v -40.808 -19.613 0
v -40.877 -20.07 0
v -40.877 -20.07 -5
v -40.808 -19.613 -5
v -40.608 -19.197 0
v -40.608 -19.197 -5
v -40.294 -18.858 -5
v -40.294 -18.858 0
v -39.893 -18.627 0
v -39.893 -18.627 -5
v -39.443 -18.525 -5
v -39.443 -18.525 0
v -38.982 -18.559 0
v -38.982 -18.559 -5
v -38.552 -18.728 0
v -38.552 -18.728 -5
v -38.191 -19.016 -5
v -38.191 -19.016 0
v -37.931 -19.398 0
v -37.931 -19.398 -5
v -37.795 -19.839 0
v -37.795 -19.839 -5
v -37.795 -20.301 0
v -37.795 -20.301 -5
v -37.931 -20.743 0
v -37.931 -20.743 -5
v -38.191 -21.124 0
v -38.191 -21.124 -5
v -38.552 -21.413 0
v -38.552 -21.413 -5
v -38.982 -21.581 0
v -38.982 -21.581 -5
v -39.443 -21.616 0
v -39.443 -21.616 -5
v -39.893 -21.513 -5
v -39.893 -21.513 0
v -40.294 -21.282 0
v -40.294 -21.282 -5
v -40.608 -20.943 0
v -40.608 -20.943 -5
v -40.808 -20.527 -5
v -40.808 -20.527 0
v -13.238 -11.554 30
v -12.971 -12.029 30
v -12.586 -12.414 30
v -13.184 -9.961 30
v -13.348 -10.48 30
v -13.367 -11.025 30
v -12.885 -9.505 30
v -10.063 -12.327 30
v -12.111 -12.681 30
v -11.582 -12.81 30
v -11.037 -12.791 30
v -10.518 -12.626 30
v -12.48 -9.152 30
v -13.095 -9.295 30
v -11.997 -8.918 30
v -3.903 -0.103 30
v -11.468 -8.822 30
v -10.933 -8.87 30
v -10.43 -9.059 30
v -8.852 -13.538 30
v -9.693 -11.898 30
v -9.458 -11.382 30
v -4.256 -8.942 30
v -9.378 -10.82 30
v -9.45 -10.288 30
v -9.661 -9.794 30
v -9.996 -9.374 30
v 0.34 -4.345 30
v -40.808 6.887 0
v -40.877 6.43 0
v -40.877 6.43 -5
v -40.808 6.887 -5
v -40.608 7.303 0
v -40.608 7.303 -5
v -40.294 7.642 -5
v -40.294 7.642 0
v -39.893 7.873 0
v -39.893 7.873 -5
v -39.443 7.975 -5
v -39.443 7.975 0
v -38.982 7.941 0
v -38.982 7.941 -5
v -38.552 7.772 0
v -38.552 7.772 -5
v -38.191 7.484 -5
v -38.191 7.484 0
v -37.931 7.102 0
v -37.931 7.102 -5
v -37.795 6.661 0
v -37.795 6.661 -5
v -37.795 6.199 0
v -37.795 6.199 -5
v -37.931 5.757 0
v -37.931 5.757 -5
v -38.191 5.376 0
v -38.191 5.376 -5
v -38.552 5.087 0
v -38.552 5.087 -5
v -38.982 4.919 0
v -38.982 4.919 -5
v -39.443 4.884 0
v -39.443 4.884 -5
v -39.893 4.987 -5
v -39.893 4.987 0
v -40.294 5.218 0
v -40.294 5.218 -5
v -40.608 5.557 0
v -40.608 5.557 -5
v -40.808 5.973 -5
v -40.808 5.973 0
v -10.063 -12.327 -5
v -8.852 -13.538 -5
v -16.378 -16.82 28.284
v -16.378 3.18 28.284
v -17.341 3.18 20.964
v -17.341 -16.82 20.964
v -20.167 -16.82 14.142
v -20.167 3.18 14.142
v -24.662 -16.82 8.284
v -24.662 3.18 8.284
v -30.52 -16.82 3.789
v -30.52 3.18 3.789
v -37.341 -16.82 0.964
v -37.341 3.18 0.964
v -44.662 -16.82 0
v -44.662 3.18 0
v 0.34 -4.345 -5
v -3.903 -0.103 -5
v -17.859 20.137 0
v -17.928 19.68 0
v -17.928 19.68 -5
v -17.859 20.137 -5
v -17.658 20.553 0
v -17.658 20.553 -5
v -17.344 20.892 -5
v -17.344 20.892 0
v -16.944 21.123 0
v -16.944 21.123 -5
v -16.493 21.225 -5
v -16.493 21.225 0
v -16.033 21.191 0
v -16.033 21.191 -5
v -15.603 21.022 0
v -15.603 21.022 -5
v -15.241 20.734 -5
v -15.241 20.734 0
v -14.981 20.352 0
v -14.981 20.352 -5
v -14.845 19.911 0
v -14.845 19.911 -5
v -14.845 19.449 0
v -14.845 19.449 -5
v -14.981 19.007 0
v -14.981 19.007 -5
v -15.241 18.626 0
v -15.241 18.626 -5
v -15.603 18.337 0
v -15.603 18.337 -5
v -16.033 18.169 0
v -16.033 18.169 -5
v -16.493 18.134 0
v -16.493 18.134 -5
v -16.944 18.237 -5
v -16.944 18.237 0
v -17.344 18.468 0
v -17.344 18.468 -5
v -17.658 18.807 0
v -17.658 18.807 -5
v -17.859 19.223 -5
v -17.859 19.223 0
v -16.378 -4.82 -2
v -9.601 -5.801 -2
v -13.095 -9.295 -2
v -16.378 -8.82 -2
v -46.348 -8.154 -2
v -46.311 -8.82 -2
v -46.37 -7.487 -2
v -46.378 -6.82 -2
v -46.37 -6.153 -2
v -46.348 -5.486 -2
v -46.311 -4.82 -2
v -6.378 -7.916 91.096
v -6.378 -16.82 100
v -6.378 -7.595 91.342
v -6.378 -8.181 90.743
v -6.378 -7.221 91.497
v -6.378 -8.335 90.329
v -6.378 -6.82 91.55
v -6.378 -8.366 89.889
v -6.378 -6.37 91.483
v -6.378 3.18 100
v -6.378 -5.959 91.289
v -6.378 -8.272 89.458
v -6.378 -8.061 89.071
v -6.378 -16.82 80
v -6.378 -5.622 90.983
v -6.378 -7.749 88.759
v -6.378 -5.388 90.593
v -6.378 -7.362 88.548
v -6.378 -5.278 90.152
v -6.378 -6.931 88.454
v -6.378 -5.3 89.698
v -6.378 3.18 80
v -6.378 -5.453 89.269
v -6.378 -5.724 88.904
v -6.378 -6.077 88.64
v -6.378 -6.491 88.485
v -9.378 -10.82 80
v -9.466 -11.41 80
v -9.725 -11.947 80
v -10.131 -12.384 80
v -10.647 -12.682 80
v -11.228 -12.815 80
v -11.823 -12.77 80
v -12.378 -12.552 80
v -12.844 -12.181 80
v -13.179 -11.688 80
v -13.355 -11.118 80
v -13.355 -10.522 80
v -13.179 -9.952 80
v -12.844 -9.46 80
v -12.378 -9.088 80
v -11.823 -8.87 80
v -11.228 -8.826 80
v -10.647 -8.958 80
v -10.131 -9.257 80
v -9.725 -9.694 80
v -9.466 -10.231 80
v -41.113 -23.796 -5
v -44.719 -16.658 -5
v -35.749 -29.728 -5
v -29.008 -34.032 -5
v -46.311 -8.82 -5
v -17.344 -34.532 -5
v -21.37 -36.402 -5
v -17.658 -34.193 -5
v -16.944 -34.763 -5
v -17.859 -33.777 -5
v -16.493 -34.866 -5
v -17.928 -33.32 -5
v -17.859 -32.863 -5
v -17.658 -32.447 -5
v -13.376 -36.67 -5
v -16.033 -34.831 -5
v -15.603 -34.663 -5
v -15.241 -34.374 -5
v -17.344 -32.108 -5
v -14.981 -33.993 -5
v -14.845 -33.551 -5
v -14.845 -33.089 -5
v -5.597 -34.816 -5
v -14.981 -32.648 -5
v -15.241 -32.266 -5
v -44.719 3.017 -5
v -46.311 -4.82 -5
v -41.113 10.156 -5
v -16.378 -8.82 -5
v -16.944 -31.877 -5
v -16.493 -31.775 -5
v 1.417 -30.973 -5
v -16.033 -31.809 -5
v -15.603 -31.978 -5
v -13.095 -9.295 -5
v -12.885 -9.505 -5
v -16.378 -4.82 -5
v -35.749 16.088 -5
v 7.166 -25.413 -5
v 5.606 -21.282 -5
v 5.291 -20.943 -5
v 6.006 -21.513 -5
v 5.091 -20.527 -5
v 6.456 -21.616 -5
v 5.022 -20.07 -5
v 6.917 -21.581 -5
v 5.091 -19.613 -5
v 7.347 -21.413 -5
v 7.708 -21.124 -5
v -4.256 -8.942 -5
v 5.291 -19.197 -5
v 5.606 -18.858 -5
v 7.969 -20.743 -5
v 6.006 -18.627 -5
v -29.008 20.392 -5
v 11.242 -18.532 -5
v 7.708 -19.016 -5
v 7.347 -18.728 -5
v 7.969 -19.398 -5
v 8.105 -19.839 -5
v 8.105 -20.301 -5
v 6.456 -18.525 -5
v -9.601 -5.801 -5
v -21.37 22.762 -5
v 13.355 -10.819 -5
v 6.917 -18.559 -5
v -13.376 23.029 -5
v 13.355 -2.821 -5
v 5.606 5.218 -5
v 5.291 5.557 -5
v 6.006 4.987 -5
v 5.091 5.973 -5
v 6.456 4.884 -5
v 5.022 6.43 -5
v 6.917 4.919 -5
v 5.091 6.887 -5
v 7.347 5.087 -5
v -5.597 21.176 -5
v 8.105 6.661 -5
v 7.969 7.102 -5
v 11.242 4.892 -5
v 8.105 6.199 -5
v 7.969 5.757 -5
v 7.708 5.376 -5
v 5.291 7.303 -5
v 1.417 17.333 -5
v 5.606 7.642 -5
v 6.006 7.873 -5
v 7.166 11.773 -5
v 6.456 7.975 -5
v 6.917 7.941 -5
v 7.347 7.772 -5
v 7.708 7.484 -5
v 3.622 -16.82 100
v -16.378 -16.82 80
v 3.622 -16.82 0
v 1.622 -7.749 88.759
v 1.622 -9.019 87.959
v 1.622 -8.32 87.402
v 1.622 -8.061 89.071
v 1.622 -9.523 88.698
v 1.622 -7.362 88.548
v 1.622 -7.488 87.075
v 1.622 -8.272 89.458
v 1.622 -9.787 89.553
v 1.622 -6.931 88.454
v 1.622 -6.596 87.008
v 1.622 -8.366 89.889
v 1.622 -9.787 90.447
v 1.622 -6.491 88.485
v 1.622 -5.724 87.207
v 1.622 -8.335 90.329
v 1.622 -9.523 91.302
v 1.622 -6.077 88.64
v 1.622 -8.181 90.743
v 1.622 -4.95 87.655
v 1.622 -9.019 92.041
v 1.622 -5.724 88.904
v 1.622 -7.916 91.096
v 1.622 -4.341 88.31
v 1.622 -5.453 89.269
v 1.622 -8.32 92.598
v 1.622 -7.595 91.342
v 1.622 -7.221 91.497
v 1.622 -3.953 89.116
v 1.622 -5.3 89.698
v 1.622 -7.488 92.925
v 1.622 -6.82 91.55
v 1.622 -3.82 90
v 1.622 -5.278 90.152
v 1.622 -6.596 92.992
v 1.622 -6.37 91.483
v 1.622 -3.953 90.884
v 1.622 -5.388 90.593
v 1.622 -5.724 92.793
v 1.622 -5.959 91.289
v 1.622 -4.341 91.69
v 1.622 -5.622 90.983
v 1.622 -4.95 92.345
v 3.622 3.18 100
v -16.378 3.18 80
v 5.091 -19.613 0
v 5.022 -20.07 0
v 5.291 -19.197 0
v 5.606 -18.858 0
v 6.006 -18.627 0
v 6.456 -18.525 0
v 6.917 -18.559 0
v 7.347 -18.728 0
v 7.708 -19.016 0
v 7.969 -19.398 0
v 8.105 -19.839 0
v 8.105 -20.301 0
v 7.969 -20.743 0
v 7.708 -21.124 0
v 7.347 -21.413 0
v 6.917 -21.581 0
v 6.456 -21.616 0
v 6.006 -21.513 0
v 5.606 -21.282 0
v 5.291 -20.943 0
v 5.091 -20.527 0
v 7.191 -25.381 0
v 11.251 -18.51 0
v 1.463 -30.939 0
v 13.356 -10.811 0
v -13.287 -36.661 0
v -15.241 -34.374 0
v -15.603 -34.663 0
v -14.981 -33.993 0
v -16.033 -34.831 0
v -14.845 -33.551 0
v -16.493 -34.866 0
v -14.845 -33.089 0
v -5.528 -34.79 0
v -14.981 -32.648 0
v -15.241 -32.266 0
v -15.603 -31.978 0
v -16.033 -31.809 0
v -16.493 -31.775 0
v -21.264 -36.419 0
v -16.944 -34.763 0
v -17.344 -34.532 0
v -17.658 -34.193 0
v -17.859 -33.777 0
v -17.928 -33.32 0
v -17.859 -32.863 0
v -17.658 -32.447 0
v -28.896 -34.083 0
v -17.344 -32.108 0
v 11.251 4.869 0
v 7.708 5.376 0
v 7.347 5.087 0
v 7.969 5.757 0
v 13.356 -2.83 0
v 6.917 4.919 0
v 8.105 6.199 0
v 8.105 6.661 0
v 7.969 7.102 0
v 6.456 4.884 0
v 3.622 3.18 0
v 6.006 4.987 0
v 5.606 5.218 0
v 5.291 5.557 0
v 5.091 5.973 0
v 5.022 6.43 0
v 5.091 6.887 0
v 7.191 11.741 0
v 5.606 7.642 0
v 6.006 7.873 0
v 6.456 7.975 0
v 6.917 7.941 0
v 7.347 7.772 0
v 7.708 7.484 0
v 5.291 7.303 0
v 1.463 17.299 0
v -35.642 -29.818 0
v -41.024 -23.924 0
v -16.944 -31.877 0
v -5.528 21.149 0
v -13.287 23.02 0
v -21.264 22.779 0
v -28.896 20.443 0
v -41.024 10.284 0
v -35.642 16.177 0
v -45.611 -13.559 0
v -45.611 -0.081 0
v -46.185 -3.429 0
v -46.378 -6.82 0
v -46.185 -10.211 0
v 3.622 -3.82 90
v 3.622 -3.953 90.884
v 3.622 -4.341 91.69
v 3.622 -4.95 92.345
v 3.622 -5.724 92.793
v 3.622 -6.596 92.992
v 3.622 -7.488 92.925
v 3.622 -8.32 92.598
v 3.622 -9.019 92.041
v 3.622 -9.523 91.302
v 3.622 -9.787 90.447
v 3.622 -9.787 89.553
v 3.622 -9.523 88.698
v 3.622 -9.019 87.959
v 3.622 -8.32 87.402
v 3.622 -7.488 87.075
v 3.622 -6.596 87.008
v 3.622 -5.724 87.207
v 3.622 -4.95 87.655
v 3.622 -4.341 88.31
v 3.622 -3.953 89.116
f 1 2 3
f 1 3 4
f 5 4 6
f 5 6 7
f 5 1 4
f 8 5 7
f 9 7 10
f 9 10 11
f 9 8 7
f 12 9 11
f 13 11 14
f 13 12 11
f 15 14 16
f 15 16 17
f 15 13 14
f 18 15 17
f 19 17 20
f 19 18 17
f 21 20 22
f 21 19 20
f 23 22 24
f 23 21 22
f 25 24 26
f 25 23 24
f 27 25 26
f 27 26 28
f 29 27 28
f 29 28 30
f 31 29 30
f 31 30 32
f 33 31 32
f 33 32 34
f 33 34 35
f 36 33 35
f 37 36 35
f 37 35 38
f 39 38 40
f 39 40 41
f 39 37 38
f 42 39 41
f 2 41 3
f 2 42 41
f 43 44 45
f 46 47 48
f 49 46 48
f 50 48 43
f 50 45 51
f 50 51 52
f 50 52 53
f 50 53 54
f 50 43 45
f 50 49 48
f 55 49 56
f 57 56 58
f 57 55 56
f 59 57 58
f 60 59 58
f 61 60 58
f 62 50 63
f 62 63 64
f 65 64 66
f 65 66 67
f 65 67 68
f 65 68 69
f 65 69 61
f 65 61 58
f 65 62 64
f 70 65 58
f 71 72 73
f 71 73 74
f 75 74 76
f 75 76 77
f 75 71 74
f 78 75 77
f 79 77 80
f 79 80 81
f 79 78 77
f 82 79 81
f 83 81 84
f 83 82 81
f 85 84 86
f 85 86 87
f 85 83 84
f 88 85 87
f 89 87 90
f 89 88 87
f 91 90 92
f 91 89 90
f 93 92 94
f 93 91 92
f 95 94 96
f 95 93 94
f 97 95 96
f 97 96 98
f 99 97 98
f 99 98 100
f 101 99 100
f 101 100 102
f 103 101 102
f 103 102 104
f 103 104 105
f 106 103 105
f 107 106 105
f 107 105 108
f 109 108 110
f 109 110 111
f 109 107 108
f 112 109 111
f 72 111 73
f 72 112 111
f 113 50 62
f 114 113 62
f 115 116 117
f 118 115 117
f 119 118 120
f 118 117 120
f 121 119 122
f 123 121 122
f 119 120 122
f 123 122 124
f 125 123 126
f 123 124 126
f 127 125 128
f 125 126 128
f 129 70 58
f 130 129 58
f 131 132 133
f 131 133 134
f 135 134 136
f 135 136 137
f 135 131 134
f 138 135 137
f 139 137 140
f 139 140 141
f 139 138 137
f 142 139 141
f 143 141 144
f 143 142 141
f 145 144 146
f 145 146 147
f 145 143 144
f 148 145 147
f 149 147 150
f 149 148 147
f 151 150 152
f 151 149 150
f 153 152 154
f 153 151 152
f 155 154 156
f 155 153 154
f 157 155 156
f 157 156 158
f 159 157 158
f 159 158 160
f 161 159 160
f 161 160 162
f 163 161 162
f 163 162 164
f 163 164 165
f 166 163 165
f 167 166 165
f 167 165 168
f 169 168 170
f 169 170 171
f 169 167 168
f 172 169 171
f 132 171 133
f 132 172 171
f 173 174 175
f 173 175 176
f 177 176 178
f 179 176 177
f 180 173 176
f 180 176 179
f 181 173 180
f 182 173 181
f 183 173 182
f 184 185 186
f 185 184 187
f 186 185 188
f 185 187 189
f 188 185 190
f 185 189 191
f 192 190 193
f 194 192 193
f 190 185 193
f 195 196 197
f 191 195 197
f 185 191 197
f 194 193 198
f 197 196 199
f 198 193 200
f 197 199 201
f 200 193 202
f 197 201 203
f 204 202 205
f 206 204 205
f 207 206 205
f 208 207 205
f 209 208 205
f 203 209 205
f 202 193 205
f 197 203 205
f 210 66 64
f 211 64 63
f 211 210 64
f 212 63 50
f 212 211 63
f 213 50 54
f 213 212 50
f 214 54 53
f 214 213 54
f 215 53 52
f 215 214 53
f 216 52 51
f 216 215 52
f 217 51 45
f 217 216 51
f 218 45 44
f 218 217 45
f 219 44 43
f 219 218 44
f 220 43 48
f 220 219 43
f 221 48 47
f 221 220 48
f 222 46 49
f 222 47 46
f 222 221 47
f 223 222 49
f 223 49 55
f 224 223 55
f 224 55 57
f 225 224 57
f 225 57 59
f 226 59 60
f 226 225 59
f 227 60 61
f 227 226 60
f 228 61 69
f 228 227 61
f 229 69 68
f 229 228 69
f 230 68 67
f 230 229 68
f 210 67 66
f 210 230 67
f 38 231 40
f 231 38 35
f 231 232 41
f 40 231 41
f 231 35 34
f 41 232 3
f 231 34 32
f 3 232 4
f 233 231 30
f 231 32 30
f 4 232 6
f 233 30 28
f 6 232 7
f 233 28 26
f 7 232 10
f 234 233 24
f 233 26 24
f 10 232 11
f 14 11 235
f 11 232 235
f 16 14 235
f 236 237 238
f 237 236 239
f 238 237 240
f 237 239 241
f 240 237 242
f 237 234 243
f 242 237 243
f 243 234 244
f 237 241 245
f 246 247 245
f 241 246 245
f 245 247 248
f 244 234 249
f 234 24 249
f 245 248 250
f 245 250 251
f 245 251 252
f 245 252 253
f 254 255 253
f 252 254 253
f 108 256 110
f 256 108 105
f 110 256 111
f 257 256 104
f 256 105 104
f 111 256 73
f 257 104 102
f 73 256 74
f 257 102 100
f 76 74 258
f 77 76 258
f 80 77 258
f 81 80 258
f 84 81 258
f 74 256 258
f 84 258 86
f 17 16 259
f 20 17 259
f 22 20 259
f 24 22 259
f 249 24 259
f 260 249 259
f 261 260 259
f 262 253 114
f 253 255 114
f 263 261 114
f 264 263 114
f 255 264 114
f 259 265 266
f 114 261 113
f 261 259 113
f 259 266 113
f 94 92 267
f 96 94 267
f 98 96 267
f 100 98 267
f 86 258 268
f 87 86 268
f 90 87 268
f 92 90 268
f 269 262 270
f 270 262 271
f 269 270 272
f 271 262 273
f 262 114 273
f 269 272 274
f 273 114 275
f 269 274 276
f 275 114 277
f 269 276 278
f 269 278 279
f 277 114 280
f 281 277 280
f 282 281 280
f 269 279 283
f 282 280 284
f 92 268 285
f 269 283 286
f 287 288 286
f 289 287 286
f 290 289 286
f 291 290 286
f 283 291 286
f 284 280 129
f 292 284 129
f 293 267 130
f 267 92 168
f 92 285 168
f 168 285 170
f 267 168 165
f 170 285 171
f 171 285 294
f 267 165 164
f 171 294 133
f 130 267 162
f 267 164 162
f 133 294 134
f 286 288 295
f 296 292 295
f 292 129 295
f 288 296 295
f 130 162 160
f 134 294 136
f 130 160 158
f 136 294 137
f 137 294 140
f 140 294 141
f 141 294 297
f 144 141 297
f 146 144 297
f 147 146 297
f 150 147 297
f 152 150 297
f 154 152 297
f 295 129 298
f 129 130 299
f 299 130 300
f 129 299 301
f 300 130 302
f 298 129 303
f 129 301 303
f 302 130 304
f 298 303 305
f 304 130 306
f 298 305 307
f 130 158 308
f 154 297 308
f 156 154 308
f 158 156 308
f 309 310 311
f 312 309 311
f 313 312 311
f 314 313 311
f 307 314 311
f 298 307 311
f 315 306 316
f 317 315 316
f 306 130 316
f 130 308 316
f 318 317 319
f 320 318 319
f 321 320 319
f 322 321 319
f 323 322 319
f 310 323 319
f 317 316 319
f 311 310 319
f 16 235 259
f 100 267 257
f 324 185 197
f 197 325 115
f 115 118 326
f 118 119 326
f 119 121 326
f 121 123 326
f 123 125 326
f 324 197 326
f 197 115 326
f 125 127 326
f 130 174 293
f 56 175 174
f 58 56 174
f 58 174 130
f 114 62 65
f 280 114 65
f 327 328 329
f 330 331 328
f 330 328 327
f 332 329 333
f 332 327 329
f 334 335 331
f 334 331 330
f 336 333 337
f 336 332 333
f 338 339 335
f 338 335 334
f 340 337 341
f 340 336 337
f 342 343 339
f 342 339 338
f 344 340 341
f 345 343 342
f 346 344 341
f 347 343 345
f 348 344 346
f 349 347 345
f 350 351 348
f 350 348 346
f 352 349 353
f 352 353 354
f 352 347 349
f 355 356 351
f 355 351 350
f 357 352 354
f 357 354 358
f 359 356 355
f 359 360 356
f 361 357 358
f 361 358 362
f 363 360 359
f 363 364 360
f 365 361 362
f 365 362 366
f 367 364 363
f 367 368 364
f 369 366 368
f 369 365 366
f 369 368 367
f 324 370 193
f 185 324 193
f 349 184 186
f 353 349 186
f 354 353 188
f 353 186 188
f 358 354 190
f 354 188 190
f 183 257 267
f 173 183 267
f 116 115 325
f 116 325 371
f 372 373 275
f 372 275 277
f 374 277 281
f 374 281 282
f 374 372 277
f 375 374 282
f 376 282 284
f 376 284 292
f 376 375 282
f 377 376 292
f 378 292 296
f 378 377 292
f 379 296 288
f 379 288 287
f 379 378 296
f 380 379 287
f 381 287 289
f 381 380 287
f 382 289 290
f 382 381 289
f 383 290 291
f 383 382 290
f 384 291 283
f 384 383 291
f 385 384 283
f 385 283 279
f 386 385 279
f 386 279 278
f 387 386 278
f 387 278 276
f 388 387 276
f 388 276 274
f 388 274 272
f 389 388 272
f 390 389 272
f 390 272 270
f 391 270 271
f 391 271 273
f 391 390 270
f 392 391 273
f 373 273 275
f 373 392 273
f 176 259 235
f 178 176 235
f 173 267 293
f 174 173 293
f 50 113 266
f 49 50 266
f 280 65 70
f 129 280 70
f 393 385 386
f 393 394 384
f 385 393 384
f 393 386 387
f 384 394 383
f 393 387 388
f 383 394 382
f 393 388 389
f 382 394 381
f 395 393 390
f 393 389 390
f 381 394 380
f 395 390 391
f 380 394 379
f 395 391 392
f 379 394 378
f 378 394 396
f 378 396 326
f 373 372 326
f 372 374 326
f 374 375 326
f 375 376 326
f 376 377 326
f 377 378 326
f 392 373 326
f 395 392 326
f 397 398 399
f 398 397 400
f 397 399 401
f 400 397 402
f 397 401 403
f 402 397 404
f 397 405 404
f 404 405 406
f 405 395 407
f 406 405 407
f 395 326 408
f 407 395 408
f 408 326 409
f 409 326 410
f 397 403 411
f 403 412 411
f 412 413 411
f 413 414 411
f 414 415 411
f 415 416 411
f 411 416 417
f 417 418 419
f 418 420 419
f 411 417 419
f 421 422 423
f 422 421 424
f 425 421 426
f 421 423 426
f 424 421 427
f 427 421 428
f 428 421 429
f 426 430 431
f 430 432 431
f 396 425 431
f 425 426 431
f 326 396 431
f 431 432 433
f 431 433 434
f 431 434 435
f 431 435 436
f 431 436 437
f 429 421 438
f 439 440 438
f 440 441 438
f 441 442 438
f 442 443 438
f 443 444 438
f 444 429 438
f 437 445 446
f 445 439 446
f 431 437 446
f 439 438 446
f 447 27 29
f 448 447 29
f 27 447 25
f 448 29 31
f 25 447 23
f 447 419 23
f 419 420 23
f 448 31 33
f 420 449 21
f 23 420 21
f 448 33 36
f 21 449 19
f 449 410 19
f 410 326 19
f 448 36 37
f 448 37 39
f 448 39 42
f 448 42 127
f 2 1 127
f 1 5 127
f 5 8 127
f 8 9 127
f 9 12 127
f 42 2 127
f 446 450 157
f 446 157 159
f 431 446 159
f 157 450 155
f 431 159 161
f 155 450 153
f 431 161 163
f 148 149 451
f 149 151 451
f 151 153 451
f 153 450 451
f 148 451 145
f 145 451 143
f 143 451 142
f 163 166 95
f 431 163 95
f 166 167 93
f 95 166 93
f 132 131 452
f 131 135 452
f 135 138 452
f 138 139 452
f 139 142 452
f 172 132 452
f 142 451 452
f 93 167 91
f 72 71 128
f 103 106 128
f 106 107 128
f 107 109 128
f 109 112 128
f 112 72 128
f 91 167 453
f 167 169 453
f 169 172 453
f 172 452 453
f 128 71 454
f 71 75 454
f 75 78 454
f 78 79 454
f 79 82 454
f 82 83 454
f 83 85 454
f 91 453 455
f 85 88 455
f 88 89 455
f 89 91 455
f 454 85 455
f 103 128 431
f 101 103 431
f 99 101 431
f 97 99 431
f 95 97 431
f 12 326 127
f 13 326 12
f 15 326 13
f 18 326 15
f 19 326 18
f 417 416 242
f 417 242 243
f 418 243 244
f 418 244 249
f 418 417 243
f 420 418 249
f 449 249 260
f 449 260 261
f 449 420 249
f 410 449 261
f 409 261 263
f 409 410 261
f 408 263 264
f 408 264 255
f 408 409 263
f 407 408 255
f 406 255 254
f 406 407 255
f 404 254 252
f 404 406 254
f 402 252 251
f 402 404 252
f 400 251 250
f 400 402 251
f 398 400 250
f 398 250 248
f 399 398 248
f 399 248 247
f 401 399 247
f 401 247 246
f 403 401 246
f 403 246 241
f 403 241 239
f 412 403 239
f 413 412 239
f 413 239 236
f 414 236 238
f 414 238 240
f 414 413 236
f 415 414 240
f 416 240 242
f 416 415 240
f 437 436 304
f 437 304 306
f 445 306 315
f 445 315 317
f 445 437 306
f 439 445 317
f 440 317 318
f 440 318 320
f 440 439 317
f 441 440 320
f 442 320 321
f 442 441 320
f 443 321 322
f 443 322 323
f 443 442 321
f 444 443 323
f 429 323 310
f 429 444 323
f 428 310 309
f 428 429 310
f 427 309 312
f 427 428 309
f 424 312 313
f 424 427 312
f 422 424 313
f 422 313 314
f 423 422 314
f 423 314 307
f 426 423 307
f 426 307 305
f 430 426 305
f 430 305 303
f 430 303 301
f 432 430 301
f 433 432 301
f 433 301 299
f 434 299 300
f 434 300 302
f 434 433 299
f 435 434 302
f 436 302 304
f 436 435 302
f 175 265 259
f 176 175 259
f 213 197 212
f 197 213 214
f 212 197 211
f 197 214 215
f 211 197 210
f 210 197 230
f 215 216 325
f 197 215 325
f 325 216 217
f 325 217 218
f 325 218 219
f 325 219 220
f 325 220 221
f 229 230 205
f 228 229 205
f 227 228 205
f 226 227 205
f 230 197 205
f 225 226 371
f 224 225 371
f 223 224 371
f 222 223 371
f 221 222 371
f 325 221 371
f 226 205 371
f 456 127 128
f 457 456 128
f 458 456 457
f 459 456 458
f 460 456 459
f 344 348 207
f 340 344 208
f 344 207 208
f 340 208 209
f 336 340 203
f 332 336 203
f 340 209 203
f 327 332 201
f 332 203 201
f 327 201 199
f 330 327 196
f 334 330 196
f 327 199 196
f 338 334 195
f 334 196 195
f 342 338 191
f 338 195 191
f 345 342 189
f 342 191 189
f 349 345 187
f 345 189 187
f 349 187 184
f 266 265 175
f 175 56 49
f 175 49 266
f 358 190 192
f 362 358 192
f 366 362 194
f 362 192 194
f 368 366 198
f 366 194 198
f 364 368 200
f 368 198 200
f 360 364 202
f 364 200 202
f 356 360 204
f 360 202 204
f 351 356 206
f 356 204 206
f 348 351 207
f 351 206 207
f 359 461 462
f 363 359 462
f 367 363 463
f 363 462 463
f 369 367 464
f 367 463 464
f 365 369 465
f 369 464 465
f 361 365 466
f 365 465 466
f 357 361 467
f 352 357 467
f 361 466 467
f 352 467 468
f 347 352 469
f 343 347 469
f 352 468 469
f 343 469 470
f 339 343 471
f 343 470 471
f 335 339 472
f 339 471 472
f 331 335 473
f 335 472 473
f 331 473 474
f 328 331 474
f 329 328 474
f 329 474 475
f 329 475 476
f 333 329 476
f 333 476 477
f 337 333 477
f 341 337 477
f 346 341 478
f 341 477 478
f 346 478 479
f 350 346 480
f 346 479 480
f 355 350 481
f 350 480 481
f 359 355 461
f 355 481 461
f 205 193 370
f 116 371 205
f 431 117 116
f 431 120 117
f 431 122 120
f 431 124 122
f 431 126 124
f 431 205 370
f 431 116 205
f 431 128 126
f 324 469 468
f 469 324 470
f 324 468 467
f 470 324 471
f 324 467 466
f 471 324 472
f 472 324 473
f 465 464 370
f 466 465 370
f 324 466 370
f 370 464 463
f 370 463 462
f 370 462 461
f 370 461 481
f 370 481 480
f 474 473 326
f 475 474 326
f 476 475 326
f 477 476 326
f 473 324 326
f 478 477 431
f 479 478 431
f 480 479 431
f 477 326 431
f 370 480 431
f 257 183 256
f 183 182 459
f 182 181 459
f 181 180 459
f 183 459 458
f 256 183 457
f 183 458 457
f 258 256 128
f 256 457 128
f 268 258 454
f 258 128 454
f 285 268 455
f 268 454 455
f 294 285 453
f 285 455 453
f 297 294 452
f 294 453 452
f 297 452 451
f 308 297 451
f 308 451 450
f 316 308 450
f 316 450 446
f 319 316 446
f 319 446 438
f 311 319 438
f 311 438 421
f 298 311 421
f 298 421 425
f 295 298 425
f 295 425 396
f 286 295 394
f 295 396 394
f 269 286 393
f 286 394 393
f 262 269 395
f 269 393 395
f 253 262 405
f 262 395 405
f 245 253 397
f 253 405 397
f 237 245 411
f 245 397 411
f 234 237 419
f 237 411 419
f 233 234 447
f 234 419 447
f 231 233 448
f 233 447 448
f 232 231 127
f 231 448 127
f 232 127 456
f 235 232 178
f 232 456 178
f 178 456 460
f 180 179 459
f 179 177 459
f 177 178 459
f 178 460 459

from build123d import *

# Parameters (mm, degrees)
SKETCH_1_W          = 20
SKETCH_1_H          = 20
EXTRUDE_1_DEPTH     = 140
SKETCH_2_R          = 30
SKETCH_2_R_2        = 1.55
EXTRUDE_2_DEPTH     = 5
SKETCH_3_W          = 28.284271248
SKETCH_3_H          = 20
EXTRUDE_3_DEPTH     = 28.28427125
CUT_EXTRUDE_1_DEPTH = 28.28427125
CUT_EXTRUDE_2_DEPTH = 28.28427125
CUT_EXTRUDE_3_DEPTH = 28.28427125
SKETCH_8_R          = 3
CUT_EXTRUDE_4_DEPTH = 2
SKETCH_9_R          = 2
CUT_EXTRUDE_5_DEPTH = 100
CUT_EXTRUDE_6_DEPTH = 3
CUT_EXTRUDE_7_DEPTH = 3
SKETCH_12_W         = 20
SKETCH_12_H         = 20
SKETCH_12_R         = 2
EXTRUDE_5_DEPTH     = 3
CUT_EXTRUDE_START   = -35
SKETCH_13_R         = 2
CUT_EXTRUDE_8_DEPTH = 35
CUT_EXTRUDE_9_DEPTH = 3
EXTRUDE_START       = -35
EXTRUDE_6_DEPTH     = 35


with BuildPart() as part:
    # 草图1 → 凸台-拉伸1 (new body)
    with BuildSketch(Plane.XY):
        with Locations((-6.377546769, -6.820183169)):
            Rectangle(SKETCH_1_W, SKETCH_1_H)
    extrude(amount=EXTRUDE_1_DEPTH)

    # 草图2 → 凸台-拉伸2 (add)
    with BuildSketch(Plane(origin=(0, 0, 0), x_dir=(-1, 0, 0), z_dir=(0, 0, -1))):
        with Locations((16.377546769, -6.820183169)):
            Circle(SKETCH_2_R)
        with Locations((-6.572126431, 6.429816831)):
            Circle(SKETCH_2_R_2, mode=Mode.SUBTRACT)
        with Locations((16.377546769, 19.679816831)):
            Circle(SKETCH_2_R_2, mode=Mode.SUBTRACT)
        with Locations((39.32721997, 6.429816831)):
            Circle(SKETCH_2_R_2, mode=Mode.SUBTRACT)
        with Locations((39.32721997, -20.070183169)):
            Circle(SKETCH_2_R_2, mode=Mode.SUBTRACT)
        with Locations((16.377546769, -33.320183169)):
            Circle(SKETCH_2_R_2, mode=Mode.SUBTRACT)
        with Locations((-6.572126431, -20.070183169)):
            Circle(SKETCH_2_R_2, mode=Mode.SUBTRACT)
    extrude(amount=EXTRUDE_2_DEPTH)

    # 草图3 → 凸台-拉伸3 (add)
    with BuildSketch(Plane.XY):
        with Locations((-30.519682393, -6.820183169)):
            Rectangle(SKETCH_3_W, SKETCH_3_H)
    extrude(amount=EXTRUDE_3_DEPTH)

    # 草图4 → 切除-拉伸1 (cut)
    with BuildSketch(Plane(origin=(0, 3.179816831, 0), x_dir=(1, 0, 0), z_dir=(0, 1, 0))):
        with BuildLine():
            Line((-44.661818017, -3e-09), (-44.661818017, -28.28427125))
            Line((-44.661818017, -28.28427125), (-16.377546769, -28.28427125))
            ThreePointArc((-16.377546769, -28.28427125), (-24.661818017, -8.28427125), (-44.661818017, -3e-09))
        make_face()
    extrude(amount=-CUT_EXTRUDE_1_DEPTH, mode=Mode.SUBTRACT)

    # 草图6 → 切除-拉伸2 (cut)
    with BuildSketch(Plane(origin=(0, 3.179816831, 0), x_dir=(1, 0, 0), z_dir=(0, 1, 0))):
        Polygon((3.622453231, -140), (3.622453231, -100), (-6.377546769, -100), (-6.377546769, -80), (-16.377546769, -80), (-16.377546769, -100), (-16.377546769, -140), align=None)
    extrude(amount=-CUT_EXTRUDE_2_DEPTH, mode=Mode.SUBTRACT)

    # 草图7 → 切除-拉伸3 (cut)
    with BuildSketch(Plane.ZY.offset(6.377546769)):
        with BuildLine():
            ThreePointArc((91.55, -6.820183169), (90.59315932, -5.388169893), (88.903984489, -5.724167658))
            Line((88.903984489, -5.724167658), (91.096015511, -7.91619868))
            ThreePointArc((91.096015511, -7.91619868), (91.432013275, -7.413342489), (91.55, -6.820183169))
        make_face()
        with BuildLine():
            Line((91.096015511, -7.91619868), (88.903984489, -5.724167658))
            ThreePointArc((88.903984489, -5.724167658), (88.903984489, -7.91619868), (91.096015511, -7.91619868))
        make_face()
    extrude(amount=-CUT_EXTRUDE_3_DEPTH, mode=Mode.SUBTRACT)

    # 草图8 → 切除-拉伸4 (cut)
    with BuildSketch(Plane(origin=(3.622453231, 0, 0), x_dir=(0, 0, -1), z_dir=(1, 0, 0))):
        with Locations(Location((-90, -6.820183169, 0), (0, 0, 90))):
            Circle(SKETCH_8_R)
    extrude(amount=-CUT_EXTRUDE_4_DEPTH, mode=Mode.SUBTRACT)

    # 草图9 → 切除-拉伸5 (cut)
    with BuildSketch(Plane.XY.offset(80)):
        with Locations((-11.377546769, -10.820183169)):
            Circle(SKETCH_9_R)
    extrude(amount=-CUT_EXTRUDE_5_DEPTH, mode=Mode.SUBTRACT)

    # 草图10 → 切除-拉伸6 (cut)
    with BuildSketch(Plane(origin=(0, 0, -5), x_dir=(-1, 0, 0), z_dir=(0, 0, -1))):
        Polygon((11.377546769, -10.820183169), (12.756937733, -12.268495932), (16.377546769, -8.820183169), (50.683077944, -8.820183169), (50.683077944, -4.820183169), (16.377546769, -4.820183169), (10.220185265, -9.18901728), align=None)
    extrude(amount=-CUT_EXTRUDE_6_DEPTH, mode=Mode.SUBTRACT)

    # 草图11 → 切除-拉伸7 (cut)
    with BuildSketch(Plane(origin=(0, 0, -5), x_dir=(-1, 0, 0), z_dir=(0, 0, -1))):
        Polygon((-3.622453231, -6.820183169), (-3.622453231, 3.179816831), (16.377546769, 3.179816831), (16.377546769, -16.820183169), (-3.622453231, -16.820183169), align=None)
    extrude(amount=-CUT_EXTRUDE_7_DEPTH, mode=Mode.SUBTRACT)

    # 草图12 → 凸台-拉伸5 (add)
    with BuildSketch(Plane(origin=(0, 0, -2), x_dir=(-1, 0, 0), z_dir=(0, 0, -1))):
        with Locations((6.377546769, -6.820183169)):
            Rectangle(SKETCH_12_W, SKETCH_12_H)
        with Locations(Location((11.377546769, -10.820183169, 0), (0, 0, 180))):
            Circle(SKETCH_12_R, mode=Mode.SUBTRACT)
    extrude(amount=EXTRUDE_5_DEPTH)

    # 草图13 → 切除-拉伸8 (cut)
    with BuildSketch(Plane(origin=(0, 0, -5), x_dir=(-1, 0, 0), z_dir=(0, 0, -1)).offset(CUT_EXTRUDE_START)):
        with Locations(Location((11.377546769, -10.820183169, 0), (0, 0, 180))):
            Circle(SKETCH_13_R)
        Polygon((-0.339967652, -4.345309435), (3.902673035, -0.102668747), (8.498867113, -4.698862825), (13.095061191, -9.295056903), (8.852420504, -13.53769759), (4.256226426, -8.941503512), align=None)
    extrude(amount=CUT_EXTRUDE_8_DEPTH, mode=Mode.SUBTRACT)

    # 草图14 → 切除-拉伸9 (cut)
    with BuildSketch(Plane(origin=(0, 0, -5), x_dir=(-1, 0, 0), z_dir=(0, 0, -1))):
        Polygon((13.095061191, -9.295056903), (16.377546769, -8.820183169), (16.377546769, -4.820183169), (9.60060106, -5.800596772), align=None)
    extrude(amount=-CUT_EXTRUDE_9_DEPTH, mode=Mode.SUBTRACT)

    # 草图15 → 凸台-拉伸6 (add)
    with BuildSketch(Plane(origin=(0, 0, -5), x_dir=(-1, 0, 0), z_dir=(0, 0, -1)).offset(EXTRUDE_START)):
        with BuildLine():
            Line((10.062802613, -12.32731548), (12.884679081, -9.505439013))
            ThreePointArc((12.884679081, -9.505439013), (12.791760332, -12.234396731), (10.062802613, -12.32731548))
        make_face()
    extrude(amount=EXTRUDE_6_DEPTH)


solid = part.part
